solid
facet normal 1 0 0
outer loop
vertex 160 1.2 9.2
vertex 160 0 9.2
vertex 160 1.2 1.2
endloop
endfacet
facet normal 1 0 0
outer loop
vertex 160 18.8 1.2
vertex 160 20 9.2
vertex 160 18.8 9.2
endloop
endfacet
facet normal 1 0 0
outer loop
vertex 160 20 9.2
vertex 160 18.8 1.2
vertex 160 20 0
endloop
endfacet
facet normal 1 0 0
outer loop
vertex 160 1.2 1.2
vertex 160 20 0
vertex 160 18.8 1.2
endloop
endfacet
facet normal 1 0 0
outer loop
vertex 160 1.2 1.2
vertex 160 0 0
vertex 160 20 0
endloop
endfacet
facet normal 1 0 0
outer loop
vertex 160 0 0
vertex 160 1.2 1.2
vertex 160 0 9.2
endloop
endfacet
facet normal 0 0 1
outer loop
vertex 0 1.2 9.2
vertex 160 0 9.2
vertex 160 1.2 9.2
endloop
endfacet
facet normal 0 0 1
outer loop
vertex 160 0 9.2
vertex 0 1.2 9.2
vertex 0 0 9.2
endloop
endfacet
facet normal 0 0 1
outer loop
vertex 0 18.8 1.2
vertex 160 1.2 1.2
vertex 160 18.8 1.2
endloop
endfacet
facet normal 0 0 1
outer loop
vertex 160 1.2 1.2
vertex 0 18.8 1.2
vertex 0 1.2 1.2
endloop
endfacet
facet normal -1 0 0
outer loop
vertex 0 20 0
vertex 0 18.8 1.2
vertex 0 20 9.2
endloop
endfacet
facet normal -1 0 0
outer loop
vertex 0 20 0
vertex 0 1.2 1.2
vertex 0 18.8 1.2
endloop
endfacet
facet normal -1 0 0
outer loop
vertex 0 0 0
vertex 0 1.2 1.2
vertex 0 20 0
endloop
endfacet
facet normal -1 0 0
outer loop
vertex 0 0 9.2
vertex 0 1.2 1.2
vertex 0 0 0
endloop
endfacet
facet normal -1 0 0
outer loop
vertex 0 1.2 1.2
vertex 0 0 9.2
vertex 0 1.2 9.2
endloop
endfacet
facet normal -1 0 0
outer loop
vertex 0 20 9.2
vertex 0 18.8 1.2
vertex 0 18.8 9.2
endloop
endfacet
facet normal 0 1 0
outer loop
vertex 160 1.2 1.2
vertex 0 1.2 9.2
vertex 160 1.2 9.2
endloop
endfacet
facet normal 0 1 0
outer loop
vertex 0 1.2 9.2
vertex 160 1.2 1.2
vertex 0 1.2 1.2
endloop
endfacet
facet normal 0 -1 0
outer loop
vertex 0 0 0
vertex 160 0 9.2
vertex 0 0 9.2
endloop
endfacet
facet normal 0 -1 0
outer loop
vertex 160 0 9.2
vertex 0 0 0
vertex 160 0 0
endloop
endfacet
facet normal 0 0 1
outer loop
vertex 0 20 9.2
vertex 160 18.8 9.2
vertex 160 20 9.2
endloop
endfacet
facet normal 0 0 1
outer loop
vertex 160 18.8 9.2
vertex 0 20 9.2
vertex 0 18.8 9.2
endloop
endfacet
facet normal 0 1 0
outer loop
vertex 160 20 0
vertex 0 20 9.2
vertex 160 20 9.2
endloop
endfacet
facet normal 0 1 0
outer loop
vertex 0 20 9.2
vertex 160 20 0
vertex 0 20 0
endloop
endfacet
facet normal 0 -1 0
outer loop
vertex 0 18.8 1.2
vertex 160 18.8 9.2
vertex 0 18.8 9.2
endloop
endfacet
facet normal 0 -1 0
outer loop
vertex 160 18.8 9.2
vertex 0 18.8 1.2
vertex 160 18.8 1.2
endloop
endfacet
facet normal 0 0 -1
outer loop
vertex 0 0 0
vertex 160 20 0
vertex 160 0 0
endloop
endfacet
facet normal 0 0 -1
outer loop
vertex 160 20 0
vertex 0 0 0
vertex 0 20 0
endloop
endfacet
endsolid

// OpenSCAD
// ScienceClaw nominal U-channel. All dimensions in millimeters.
// Clamp the first clamp_length along x. No holes or clamp reinforcement.
// Print parameters, layer orientation, material batch, and actual dimensions
// must be recorded separately; this file does not prescribe a qualified process.
length = 160;
clamp_length = 25;
base_width = 20;
wall_height = 8;
thickness = 1.2;
assert(length > clamp_length && clamp_length > 0);
assert(base_width > 2 * thickness && thickness > 0 && wall_height >= 0);
union() {
    cube([length, base_width, thickness]);
    if (wall_height > 0) {
        translate([0, 0, thickness]) cube([length, thickness, wall_height]);
        translate([0, base_width - thickness, thickness]) cube([length, thickness, wall_height]);
    }
}
